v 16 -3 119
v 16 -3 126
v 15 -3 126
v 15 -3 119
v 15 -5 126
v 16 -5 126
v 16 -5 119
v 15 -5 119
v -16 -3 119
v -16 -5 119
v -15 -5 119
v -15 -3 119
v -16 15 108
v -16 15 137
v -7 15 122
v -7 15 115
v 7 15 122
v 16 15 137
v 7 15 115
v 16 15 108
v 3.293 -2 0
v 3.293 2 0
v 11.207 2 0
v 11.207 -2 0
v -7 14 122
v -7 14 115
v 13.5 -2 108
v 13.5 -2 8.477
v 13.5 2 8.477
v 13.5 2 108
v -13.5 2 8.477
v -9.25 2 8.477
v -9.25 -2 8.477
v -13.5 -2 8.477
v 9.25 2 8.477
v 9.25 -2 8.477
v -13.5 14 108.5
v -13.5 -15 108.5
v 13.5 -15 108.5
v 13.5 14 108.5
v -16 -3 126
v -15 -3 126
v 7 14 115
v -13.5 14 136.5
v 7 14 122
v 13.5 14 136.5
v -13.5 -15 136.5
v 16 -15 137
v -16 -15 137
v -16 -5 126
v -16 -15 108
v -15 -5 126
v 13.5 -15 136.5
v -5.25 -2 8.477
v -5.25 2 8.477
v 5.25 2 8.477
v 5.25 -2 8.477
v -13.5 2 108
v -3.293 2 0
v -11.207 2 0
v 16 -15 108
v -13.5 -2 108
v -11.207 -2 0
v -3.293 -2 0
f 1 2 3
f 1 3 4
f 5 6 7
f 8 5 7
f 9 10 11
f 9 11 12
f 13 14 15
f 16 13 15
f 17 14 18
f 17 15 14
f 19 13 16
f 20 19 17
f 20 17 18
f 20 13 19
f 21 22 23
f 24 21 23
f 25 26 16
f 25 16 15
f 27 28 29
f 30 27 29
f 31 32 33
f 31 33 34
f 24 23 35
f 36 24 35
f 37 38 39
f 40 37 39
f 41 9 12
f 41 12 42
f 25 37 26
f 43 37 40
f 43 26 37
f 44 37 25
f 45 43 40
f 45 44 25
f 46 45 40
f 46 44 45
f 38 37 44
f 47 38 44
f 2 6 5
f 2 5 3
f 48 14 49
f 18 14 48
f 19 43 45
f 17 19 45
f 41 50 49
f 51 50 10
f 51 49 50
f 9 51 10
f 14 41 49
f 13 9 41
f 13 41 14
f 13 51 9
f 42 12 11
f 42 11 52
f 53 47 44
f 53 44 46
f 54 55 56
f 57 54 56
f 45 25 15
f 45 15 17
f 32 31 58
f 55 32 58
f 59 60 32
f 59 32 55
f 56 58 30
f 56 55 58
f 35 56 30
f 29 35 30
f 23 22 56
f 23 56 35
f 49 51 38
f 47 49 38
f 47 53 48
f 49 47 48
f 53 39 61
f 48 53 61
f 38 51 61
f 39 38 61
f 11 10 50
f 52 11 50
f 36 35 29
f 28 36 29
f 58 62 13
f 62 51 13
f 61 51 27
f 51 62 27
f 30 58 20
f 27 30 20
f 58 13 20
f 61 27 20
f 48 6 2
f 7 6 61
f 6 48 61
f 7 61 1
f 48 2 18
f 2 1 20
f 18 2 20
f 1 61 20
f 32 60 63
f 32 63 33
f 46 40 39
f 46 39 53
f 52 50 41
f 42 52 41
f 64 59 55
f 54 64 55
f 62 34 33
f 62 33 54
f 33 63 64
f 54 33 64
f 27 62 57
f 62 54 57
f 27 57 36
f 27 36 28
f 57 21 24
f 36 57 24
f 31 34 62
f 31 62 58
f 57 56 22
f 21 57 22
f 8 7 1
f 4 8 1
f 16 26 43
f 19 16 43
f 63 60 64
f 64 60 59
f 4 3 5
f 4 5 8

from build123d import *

# Parameters (mm, degrees)
ESQUISSE1_W             = 27
ESQUISSE1_H             = 4
BOSS_EXTRU_1_DEPTH      = 108
ENL_V_MAT_EXTRU_3_DEPTH = 109.913956865
ESQUISSE2_W             = 32
ESQUISSE2_H             = 30
BOSS_EXTRU_2_DEPTH      = 29
ESQUISSE17_W            = 27
ESQUISSE17_H            = 28
ENL_V_MAT_EXTRU_4_DEPTH = 29
ESQUISSE18_W            = 7
ESQUISSE18_H            = 2
ENL_V_MAT_EXTRU_6_DEPTH = 1
ESQUISSE24_W            = 7
ESQUISSE24_H            = 2
ENL_V_MAT_EXTRU_7_DEPTH = 1
ESQUISSE26_W            = 14
ESQUISSE26_H            = 7
ENL_V_MAT_EXTRU_8_DEPTH = 141.946798474


with BuildPart() as part:
    # Esquisse1 → Boss.-Extru.1 (new body)
    with BuildSketch(Plane.XY):
        Rectangle(ESQUISSE1_W, ESQUISSE1_H)
    extrude(amount=BOSS_EXTRU_1_DEPTH)

    # Esquisse12 → Enlèv. mat.-Extru.3 (cut, through all)
    with BuildSketch(Plane(origin=(0, 2, 0), x_dir=(1, 0, 0), z_dir=(0, 1, 0))):
        Polygon((-13.5, 0), (-11.207074173, 0), (-9.25, -8.477019564), (-13.5, -8.477019564), align=None)
        Polygon((-3.292925827, 0), (-5.25, -8.477019564), (5.25, -8.477019564), (3.292925827, 0), align=None)
        Polygon((11.207074173, 0), (9.25, -8.477019564), (13.5, -8.477019564), (13.5, 0), align=None)
    extrude(amount=-ENL_V_MAT_EXTRU_3_DEPTH, mode=Mode.SUBTRACT)

    # Esquisse2 → Boss.-Extru.2 (add)
    with BuildSketch(Plane.XY.offset(108)):
        Rectangle(ESQUISSE2_W, ESQUISSE2_H)
    extrude(amount=BOSS_EXTRU_2_DEPTH)

    # Esquisse17 → Enlèv. mat.-Extru.4 (cut)
    with BuildSketch(Plane.XZ.offset(15)):
        with Locations((0, 122.5)):
            Rectangle(ESQUISSE17_W, ESQUISSE17_H)
    extrude(amount=-ENL_V_MAT_EXTRU_4_DEPTH, mode=Mode.SUBTRACT)

    # Esquisse18 → Enlèv. mat.-Extru.6 (cut)
    with BuildSketch(Plane(origin=(16, 0, 0), x_dir=(0, 0, -1), z_dir=(1, 0, 0))):
        with Locations((-122.5, -4)):
            Rectangle(ESQUISSE18_W, ESQUISSE18_H)
    extrude(amount=-ENL_V_MAT_EXTRU_6_DEPTH, mode=Mode.SUBTRACT)

    # Esquisse24 → Enlèv. mat.-Extru.7 (cut)
    with BuildSketch(Plane.ZY.offset(16)):
        with Locations((122.5, -4)):
            Rectangle(ESQUISSE24_W, ESQUISSE24_H)
    extrude(amount=-ENL_V_MAT_EXTRU_7_DEPTH, mode=Mode.SUBTRACT)

    # Esquisse26 → Enlèv. mat.-Extru.8 (cut, through all)
    with BuildSketch(Plane.XZ.offset(-14)):
        with Locations((0, 118.5)):
            Rectangle(ESQUISSE26_W, ESQUISSE26_H)
    extrude(amount=-ENL_V_MAT_EXTRU_8_DEPTH, mode=Mode.SUBTRACT)


solid = part.part
